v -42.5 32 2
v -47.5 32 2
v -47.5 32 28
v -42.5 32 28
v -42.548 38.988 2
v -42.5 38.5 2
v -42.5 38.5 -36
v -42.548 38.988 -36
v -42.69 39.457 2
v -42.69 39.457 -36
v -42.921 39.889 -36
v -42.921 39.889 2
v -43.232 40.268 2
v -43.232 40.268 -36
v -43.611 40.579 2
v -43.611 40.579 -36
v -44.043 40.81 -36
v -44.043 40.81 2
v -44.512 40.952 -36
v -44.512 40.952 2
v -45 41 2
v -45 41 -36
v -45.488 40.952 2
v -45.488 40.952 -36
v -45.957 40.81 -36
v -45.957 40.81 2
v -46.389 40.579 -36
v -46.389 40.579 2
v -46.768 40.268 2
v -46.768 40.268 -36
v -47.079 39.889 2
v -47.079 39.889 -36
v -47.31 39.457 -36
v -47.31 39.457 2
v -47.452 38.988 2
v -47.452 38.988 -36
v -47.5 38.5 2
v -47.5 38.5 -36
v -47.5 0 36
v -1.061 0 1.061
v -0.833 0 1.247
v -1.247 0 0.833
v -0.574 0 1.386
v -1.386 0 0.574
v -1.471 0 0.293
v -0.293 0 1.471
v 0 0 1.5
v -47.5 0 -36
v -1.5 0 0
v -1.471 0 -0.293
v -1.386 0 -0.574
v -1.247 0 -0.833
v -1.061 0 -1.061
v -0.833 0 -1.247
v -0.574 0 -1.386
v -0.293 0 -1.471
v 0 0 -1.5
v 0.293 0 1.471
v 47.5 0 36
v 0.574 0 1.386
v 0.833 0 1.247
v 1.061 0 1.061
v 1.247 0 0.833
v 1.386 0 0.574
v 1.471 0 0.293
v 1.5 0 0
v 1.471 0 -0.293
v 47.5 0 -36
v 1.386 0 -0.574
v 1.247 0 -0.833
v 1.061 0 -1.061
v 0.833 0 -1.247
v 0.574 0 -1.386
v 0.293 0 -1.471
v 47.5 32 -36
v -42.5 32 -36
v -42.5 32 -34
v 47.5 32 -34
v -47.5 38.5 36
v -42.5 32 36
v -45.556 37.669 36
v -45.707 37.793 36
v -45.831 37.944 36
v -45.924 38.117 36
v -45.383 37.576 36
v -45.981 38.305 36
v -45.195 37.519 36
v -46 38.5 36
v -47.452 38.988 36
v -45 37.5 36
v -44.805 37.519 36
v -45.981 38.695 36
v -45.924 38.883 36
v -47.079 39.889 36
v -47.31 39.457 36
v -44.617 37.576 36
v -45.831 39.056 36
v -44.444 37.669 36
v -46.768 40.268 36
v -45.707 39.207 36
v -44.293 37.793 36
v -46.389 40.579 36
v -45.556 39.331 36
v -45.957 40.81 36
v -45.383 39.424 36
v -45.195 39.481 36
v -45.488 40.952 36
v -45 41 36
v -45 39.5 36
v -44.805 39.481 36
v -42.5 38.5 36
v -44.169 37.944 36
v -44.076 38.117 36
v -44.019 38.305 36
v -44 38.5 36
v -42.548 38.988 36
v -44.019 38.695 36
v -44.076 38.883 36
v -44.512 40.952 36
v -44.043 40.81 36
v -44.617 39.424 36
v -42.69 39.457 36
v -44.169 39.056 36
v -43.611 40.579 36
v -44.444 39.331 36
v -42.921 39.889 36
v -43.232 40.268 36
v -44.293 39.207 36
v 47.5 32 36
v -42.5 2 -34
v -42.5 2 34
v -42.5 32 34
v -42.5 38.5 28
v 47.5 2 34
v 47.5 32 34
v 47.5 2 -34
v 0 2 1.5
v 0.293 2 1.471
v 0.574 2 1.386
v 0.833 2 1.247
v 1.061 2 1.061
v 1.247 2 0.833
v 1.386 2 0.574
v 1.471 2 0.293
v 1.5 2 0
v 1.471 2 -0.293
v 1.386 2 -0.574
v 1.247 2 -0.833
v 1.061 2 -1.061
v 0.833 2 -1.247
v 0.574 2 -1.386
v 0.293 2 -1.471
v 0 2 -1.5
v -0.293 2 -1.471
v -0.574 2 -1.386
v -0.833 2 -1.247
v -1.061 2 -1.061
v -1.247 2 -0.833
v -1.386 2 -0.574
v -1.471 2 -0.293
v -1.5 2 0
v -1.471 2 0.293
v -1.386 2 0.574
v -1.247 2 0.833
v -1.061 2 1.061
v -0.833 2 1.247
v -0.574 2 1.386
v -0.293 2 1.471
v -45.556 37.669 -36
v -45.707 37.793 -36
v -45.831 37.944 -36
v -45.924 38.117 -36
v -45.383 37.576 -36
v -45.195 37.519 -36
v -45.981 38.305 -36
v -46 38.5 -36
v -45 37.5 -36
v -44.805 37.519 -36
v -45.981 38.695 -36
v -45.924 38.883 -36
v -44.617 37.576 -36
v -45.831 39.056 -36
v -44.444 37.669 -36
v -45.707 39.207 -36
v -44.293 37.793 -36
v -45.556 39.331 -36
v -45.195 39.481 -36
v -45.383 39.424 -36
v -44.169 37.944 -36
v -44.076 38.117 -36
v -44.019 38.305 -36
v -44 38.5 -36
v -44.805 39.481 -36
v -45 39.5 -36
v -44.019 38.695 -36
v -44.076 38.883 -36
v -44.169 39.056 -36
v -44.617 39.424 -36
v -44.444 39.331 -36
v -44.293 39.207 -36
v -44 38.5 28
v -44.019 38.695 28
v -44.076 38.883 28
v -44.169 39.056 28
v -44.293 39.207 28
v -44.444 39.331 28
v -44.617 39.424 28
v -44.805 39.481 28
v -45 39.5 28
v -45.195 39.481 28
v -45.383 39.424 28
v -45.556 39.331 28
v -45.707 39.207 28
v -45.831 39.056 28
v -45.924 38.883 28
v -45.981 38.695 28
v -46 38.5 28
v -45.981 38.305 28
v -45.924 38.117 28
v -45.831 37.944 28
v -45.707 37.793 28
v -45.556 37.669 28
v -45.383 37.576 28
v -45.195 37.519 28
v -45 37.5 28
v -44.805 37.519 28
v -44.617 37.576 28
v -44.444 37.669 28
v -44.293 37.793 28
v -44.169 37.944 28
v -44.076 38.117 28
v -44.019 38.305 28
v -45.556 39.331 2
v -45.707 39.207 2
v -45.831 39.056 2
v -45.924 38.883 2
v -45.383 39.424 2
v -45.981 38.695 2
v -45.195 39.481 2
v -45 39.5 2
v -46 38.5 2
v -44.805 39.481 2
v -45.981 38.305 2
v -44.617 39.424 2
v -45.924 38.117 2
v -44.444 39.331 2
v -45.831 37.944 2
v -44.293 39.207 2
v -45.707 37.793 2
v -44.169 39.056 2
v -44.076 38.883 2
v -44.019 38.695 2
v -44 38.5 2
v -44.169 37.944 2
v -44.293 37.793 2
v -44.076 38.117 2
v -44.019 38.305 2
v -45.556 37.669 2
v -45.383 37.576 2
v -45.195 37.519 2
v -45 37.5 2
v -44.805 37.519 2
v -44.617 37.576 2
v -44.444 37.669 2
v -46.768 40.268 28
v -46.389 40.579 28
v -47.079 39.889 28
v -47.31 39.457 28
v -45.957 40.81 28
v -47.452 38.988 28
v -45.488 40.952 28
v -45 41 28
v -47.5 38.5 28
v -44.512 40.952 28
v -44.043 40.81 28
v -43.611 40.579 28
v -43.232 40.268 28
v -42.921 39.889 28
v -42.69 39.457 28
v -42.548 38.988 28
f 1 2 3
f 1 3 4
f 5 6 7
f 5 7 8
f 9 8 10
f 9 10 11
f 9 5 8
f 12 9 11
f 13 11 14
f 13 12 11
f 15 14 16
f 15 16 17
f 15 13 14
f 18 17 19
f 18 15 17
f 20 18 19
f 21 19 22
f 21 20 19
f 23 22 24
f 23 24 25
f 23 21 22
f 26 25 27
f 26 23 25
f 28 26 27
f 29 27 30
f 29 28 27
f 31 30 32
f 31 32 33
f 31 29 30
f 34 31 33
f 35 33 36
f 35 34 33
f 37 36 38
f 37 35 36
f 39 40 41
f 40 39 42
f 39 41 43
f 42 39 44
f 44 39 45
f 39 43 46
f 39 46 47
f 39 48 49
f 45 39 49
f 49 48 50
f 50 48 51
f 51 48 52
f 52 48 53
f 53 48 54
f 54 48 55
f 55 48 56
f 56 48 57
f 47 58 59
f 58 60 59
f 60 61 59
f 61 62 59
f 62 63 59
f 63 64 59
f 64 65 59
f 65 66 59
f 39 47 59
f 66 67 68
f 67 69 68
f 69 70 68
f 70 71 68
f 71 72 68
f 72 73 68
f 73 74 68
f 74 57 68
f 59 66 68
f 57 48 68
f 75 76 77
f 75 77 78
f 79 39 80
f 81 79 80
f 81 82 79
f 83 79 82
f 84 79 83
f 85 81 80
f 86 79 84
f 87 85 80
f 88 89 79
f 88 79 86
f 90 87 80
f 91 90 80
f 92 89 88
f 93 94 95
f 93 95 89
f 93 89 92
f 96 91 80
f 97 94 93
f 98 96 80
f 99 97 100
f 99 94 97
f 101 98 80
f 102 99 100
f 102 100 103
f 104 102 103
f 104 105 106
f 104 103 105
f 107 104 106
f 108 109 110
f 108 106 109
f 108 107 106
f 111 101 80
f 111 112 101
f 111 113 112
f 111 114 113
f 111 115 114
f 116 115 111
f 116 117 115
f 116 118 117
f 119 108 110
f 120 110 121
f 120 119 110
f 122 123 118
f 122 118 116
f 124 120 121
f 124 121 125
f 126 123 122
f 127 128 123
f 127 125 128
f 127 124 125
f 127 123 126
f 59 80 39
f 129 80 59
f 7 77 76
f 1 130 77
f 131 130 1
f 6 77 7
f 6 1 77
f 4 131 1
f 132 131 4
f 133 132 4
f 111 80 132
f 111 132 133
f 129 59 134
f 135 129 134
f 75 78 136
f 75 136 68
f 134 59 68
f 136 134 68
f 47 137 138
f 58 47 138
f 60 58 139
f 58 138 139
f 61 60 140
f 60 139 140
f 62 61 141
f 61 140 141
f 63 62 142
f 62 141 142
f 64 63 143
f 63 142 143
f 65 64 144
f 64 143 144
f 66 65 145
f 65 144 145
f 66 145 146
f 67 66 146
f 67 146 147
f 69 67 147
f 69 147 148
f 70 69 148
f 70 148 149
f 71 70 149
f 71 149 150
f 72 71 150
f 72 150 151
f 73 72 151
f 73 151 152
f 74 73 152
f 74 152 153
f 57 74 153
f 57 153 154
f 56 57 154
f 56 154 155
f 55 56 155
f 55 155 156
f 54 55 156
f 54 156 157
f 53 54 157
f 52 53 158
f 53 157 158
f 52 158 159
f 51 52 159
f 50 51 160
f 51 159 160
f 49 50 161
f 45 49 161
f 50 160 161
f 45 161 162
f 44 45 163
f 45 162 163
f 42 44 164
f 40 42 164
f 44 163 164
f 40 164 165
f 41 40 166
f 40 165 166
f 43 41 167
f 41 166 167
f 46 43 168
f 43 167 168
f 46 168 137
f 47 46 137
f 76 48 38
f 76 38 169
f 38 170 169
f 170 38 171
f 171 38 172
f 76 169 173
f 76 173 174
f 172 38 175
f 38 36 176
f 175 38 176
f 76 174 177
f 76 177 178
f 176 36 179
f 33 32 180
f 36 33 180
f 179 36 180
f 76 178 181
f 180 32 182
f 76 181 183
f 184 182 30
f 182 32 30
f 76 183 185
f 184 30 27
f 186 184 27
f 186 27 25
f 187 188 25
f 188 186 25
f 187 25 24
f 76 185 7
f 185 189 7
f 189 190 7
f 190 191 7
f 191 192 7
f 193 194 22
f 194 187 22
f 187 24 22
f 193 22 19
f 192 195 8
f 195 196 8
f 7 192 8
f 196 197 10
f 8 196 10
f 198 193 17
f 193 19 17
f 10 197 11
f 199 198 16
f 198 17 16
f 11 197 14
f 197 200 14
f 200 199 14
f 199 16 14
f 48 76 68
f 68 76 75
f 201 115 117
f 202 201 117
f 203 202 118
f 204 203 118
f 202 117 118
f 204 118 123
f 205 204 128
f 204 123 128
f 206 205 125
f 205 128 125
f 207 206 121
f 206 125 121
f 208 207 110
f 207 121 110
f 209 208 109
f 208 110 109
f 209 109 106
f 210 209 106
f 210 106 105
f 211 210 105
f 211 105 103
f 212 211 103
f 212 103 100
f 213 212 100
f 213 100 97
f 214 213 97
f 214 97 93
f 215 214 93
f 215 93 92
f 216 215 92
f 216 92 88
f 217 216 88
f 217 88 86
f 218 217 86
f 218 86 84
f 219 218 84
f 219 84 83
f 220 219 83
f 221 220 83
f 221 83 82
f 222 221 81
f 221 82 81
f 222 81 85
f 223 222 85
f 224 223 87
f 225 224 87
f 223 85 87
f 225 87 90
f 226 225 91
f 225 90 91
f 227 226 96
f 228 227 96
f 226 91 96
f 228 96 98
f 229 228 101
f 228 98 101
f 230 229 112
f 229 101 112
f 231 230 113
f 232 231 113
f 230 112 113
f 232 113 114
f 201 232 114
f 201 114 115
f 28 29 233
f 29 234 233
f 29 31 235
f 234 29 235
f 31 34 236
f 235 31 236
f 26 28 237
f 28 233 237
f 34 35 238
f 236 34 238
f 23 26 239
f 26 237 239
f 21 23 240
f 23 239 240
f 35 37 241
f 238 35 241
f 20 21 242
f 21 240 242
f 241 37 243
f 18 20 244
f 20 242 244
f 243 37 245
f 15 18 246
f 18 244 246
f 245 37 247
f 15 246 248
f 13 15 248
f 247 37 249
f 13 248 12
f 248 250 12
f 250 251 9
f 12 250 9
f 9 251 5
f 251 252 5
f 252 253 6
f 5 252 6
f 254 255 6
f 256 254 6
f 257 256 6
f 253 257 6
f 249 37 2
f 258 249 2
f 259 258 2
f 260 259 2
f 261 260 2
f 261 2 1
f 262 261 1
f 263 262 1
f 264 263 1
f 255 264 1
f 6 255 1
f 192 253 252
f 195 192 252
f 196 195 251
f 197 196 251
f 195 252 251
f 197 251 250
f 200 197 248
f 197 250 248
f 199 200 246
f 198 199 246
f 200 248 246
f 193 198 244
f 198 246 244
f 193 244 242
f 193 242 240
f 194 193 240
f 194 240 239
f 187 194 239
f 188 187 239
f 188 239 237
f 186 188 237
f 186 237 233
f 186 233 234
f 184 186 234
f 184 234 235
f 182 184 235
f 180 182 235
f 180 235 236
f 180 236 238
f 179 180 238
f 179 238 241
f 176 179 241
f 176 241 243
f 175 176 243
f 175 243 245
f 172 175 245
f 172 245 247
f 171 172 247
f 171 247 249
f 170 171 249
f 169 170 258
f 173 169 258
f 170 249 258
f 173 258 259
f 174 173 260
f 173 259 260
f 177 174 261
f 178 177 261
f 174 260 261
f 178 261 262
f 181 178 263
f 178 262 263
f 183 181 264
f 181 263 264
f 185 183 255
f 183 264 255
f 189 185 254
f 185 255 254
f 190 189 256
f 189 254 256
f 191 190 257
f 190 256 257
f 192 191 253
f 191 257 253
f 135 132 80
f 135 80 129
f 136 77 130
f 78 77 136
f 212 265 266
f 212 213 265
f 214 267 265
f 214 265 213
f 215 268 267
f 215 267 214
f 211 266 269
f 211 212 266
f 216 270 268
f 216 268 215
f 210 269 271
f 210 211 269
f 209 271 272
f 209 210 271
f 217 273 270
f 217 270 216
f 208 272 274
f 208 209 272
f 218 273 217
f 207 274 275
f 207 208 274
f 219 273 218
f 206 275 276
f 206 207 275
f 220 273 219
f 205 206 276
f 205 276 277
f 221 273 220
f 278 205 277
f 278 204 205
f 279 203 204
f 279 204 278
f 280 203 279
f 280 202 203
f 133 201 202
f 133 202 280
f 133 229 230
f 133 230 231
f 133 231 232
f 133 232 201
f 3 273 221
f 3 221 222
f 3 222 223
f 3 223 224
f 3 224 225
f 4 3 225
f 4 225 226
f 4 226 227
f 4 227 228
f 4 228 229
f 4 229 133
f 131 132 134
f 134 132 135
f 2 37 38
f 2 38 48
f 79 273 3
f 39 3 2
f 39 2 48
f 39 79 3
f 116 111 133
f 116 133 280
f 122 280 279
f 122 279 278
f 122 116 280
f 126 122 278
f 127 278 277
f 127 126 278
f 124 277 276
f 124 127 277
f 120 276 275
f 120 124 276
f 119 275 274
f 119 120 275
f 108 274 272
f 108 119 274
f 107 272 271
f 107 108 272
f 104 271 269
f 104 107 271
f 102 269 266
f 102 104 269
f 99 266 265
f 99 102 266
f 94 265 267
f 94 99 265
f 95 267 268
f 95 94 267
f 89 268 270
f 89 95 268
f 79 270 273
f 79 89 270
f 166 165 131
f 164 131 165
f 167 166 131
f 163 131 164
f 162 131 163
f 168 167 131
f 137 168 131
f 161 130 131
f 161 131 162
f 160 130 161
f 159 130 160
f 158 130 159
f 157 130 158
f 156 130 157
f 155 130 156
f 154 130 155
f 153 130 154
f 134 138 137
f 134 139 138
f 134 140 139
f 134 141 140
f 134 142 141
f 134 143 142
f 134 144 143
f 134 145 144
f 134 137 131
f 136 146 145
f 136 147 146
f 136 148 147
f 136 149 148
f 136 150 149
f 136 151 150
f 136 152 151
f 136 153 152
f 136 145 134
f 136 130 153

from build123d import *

# Parameters (mm, degrees)
SKETCH1_W               = 95
SKETCH1_H               = 72
BOSS_EXTRUDE1_DEPTH     = 35
SKETCH5_W               = 90
SKETCH5_H               = 68
CUT_EXTRUDE1_DEPTH      = 33
SKETCH10_R              = 1
BOSS_EXTRUDE5_DEPTH     = 72
CUT_EXTRUDE2_DEPTH      = 10
CUT_EXTRUDE2_DEPTH_BACK = 3
SKETCH19_W              = 5
SKETCH19_H              = 26
SKETCH20_W              = 90
SKETCH20_H              = 72
CUT_EXTRUDE3_DEPTH      = 3
SKETCH21_R              = 1.5
CUT_EXTRUDE4_DEPTH      = 72.226750593


with BuildPart() as part:
    # Sketch1 → Boss-Extrude1 (new body)
    with BuildSketch(Plane(origin=(0, 0, 0), x_dir=(1, 0, 0), z_dir=(0, 1, 0))):
        Rectangle(SKETCH1_W, SKETCH1_H)
    extrude(amount=BOSS_EXTRUDE1_DEPTH)

    # Sketch5 → Cut-Extrude1 (cut)
    with BuildSketch(Plane(origin=(0, 35, 0), x_dir=(1, 0, 0), z_dir=(0, 1, 0))):
        with Locations((2.5, 0)):
            Rectangle(SKETCH5_W, SKETCH5_H)
    extrude(amount=-CUT_EXTRUDE1_DEPTH, mode=Mode.SUBTRACT)

    # Sketch10 → Boss-Extrude5 (add, through all)
    with BuildSketch(Plane.XY.offset(36)):
        with BuildLine():
            Line((-42.5, 35), (-42.5, 38.5))
            ThreePointArc((-42.5, 38.5), (-45, 41), (-47.5, 38.5))
            Line((-47.5, 38.5), (-47.5, 35))
            Line((-47.5, 35), (-42.5, 35))
        make_face()
        with Locations((-45, 38.5)):
            Circle(SKETCH10_R, mode=Mode.SUBTRACT)
    extrude(amount=-BOSS_EXTRUDE5_DEPTH)

    # Sketch19 → Cut-Extrude2 (cut, two sides: drawn at the far end of the back side and taken through both)
    with BuildSketch(Plane(origin=(0, 35, 0), x_dir=(1, 0, 0), z_dir=(0, 1, 0)).offset(-CUT_EXTRUDE2_DEPTH_BACK)):
        with Locations((-45, -15)):
            Rectangle(SKETCH19_W, SKETCH19_H)
    extrude(amount=CUT_EXTRUDE2_DEPTH + CUT_EXTRUDE2_DEPTH_BACK, mode=Mode.SUBTRACT)

    # Sketch20 → Cut-Extrude3 (cut)
    with BuildSketch(Plane(origin=(0, 35, 0), x_dir=(1, 0, 0), z_dir=(0, 1, 0))):
        with Locations((2.5, 0)):
            Rectangle(SKETCH20_W, SKETCH20_H)
    extrude(amount=-CUT_EXTRUDE3_DEPTH, mode=Mode.SUBTRACT)

    # Sketch21 → Cut-Extrude4 (cut, through all)
    with BuildSketch(Plane(origin=(0, 2, 0), x_dir=(1, 0, 0), z_dir=(0, 1, 0))):
        with Locations(Location((0, 0, 0), (0, 0, 270))):
            Circle(SKETCH21_R)
    extrude(amount=-CUT_EXTRUDE4_DEPTH, mode=Mode.SUBTRACT)


solid = part.part
